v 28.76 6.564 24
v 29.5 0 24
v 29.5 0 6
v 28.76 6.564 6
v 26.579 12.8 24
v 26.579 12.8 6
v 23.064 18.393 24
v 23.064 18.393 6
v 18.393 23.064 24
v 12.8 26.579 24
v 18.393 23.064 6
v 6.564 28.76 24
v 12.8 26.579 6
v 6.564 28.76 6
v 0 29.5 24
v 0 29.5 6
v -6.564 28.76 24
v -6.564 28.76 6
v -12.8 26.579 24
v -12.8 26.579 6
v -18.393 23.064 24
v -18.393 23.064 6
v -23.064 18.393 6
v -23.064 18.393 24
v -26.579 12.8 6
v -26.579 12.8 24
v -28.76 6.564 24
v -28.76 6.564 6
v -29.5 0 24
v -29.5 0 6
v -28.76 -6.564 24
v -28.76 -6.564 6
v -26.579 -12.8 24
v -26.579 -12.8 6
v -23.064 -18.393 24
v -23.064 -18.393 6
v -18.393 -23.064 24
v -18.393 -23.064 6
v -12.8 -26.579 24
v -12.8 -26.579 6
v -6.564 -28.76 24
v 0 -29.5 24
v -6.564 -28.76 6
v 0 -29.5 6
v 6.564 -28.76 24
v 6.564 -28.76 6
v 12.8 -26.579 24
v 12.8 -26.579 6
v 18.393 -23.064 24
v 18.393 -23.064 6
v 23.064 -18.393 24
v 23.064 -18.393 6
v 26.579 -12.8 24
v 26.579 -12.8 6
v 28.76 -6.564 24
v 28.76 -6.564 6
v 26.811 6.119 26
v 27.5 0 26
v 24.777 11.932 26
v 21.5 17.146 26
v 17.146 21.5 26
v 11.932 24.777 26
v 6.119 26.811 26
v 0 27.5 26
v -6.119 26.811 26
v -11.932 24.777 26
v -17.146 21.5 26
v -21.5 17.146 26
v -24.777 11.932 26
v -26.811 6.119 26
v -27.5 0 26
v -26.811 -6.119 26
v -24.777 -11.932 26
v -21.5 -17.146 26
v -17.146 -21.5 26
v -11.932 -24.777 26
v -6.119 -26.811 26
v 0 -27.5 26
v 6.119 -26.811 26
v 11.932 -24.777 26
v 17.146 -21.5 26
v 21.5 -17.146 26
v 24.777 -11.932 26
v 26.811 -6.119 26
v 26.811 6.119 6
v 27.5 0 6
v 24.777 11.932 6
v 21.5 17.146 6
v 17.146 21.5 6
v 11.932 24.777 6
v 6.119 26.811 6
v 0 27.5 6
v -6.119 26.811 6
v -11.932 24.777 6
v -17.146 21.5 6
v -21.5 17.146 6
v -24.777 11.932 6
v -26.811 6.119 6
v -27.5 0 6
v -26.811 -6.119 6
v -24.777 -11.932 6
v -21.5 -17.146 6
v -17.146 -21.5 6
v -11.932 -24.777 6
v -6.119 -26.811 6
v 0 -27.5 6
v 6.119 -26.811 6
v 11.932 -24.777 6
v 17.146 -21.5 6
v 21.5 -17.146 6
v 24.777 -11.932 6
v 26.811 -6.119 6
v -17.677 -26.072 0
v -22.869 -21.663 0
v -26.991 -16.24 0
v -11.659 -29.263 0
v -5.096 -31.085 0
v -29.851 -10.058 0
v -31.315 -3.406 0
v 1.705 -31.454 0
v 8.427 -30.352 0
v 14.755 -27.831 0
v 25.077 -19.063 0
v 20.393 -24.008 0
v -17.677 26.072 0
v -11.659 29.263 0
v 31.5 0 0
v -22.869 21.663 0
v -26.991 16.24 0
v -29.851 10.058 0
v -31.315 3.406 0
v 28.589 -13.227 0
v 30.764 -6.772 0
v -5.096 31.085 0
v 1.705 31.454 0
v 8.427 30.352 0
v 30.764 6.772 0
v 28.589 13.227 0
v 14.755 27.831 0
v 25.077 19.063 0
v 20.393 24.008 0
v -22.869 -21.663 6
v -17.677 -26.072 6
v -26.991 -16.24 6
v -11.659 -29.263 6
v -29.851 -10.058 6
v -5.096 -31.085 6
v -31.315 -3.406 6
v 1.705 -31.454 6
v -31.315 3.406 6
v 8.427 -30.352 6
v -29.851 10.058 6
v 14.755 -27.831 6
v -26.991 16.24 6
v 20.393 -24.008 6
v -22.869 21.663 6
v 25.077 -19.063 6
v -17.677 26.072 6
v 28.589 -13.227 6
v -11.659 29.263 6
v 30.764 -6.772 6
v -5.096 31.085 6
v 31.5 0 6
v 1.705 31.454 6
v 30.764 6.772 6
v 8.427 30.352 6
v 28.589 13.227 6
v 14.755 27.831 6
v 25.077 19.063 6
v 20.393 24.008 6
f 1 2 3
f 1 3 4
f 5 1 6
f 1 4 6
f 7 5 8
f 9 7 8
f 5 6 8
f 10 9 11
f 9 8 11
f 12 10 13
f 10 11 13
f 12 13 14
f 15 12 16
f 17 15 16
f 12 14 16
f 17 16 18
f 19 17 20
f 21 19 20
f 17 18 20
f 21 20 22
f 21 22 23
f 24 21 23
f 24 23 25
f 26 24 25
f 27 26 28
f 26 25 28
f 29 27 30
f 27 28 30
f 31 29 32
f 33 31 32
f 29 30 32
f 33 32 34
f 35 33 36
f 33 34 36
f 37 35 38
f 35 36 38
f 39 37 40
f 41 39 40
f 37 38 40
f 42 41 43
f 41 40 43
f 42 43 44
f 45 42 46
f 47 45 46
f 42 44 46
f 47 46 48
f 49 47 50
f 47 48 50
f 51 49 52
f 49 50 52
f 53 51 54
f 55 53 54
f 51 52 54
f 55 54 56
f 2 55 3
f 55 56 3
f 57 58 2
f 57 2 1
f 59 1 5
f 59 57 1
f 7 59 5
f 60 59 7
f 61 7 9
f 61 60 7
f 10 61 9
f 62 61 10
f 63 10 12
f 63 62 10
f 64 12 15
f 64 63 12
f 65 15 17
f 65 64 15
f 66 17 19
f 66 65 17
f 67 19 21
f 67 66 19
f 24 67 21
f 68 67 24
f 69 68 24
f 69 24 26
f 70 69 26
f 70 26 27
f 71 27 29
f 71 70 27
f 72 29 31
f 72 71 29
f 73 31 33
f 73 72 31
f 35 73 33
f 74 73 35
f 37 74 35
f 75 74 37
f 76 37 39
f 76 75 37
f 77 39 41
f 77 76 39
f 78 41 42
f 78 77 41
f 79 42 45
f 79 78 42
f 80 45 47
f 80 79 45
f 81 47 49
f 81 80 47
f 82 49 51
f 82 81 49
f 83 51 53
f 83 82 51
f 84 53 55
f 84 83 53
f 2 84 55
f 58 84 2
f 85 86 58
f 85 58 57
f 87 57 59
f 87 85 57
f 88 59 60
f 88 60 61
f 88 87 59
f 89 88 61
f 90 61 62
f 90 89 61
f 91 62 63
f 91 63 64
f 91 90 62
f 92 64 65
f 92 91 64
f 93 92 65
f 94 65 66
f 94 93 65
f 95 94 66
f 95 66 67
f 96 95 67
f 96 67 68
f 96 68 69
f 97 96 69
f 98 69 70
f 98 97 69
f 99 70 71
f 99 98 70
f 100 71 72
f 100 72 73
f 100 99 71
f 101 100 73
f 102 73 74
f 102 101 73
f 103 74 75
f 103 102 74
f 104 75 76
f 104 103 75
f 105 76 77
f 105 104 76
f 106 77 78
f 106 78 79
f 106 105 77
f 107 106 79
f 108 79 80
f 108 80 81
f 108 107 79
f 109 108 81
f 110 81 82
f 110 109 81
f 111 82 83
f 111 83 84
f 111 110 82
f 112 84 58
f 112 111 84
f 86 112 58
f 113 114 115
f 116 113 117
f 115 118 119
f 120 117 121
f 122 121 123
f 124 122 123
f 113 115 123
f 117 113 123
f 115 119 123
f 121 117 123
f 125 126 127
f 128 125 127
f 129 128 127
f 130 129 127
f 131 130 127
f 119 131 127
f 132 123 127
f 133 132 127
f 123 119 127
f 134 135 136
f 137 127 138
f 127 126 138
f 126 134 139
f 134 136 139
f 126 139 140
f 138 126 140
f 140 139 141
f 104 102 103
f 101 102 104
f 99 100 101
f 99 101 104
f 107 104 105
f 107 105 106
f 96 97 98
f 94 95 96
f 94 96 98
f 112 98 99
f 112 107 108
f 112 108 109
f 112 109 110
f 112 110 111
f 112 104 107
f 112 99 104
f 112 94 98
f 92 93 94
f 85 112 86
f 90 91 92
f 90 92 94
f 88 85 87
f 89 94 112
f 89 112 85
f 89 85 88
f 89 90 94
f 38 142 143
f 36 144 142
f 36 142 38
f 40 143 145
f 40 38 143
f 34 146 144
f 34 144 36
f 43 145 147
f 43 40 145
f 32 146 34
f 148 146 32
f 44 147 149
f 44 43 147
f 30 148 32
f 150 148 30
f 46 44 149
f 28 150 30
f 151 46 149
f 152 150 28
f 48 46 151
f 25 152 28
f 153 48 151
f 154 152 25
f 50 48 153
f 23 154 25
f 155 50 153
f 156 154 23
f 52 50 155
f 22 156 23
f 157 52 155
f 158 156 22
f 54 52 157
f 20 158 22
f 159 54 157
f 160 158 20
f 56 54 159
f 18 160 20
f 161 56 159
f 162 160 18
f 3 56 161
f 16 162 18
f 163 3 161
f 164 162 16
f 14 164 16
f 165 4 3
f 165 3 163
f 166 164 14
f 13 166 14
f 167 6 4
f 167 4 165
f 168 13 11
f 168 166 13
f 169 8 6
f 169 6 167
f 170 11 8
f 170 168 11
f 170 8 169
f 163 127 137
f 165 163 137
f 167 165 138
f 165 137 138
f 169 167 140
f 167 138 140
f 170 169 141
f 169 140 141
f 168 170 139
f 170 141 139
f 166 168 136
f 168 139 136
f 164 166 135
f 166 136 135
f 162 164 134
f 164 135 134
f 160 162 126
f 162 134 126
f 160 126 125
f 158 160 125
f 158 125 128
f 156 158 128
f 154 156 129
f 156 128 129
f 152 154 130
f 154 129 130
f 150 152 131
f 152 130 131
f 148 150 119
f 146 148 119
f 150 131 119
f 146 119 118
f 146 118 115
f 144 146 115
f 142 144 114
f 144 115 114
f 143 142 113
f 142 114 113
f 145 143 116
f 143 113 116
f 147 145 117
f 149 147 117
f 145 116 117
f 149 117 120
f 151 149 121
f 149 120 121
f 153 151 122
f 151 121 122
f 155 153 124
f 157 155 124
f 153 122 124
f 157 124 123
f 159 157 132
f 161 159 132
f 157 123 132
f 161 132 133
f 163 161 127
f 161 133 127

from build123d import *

# Parameters (mm, degrees)
ESBO_O1_R                = 31.5
RESSALTO_EXTRUS_O1_DEPTH = 6
ESBO_O2_R                = 29.5
ESBO_O2_R_2              = 27.5
RESSALTO_EXTRUS_O2_DEPTH = 20
CHANFRO1_SIZE            = 2


with BuildPart() as part:
    # Esboço1 → Ressalto-extrusão1 (new body)
    with BuildSketch(Plane.XY):
        Circle(ESBO_O1_R)
    extrude(amount=RESSALTO_EXTRUS_O1_DEPTH)

    # Esboço2 → Ressalto-extrusão2 (add)
    with BuildSketch(Plane.XY.offset(6)):
        Circle(ESBO_O2_R)
        Circle(ESBO_O2_R_2, mode=Mode.SUBTRACT)
    extrude(amount=RESSALTO_EXTRUS_O2_DEPTH)

    # Chanfro1
    chanfro1_edges = [part.edges().sort_by_distance(p)[0] for p in [
        (-29.5, 0, 26),
    ]]
    chamfer(chanfro1_edges, length=CHANFRO1_SIZE - 0.0001)  # a hair under: the kernel refuses the full size


solid = part.part
